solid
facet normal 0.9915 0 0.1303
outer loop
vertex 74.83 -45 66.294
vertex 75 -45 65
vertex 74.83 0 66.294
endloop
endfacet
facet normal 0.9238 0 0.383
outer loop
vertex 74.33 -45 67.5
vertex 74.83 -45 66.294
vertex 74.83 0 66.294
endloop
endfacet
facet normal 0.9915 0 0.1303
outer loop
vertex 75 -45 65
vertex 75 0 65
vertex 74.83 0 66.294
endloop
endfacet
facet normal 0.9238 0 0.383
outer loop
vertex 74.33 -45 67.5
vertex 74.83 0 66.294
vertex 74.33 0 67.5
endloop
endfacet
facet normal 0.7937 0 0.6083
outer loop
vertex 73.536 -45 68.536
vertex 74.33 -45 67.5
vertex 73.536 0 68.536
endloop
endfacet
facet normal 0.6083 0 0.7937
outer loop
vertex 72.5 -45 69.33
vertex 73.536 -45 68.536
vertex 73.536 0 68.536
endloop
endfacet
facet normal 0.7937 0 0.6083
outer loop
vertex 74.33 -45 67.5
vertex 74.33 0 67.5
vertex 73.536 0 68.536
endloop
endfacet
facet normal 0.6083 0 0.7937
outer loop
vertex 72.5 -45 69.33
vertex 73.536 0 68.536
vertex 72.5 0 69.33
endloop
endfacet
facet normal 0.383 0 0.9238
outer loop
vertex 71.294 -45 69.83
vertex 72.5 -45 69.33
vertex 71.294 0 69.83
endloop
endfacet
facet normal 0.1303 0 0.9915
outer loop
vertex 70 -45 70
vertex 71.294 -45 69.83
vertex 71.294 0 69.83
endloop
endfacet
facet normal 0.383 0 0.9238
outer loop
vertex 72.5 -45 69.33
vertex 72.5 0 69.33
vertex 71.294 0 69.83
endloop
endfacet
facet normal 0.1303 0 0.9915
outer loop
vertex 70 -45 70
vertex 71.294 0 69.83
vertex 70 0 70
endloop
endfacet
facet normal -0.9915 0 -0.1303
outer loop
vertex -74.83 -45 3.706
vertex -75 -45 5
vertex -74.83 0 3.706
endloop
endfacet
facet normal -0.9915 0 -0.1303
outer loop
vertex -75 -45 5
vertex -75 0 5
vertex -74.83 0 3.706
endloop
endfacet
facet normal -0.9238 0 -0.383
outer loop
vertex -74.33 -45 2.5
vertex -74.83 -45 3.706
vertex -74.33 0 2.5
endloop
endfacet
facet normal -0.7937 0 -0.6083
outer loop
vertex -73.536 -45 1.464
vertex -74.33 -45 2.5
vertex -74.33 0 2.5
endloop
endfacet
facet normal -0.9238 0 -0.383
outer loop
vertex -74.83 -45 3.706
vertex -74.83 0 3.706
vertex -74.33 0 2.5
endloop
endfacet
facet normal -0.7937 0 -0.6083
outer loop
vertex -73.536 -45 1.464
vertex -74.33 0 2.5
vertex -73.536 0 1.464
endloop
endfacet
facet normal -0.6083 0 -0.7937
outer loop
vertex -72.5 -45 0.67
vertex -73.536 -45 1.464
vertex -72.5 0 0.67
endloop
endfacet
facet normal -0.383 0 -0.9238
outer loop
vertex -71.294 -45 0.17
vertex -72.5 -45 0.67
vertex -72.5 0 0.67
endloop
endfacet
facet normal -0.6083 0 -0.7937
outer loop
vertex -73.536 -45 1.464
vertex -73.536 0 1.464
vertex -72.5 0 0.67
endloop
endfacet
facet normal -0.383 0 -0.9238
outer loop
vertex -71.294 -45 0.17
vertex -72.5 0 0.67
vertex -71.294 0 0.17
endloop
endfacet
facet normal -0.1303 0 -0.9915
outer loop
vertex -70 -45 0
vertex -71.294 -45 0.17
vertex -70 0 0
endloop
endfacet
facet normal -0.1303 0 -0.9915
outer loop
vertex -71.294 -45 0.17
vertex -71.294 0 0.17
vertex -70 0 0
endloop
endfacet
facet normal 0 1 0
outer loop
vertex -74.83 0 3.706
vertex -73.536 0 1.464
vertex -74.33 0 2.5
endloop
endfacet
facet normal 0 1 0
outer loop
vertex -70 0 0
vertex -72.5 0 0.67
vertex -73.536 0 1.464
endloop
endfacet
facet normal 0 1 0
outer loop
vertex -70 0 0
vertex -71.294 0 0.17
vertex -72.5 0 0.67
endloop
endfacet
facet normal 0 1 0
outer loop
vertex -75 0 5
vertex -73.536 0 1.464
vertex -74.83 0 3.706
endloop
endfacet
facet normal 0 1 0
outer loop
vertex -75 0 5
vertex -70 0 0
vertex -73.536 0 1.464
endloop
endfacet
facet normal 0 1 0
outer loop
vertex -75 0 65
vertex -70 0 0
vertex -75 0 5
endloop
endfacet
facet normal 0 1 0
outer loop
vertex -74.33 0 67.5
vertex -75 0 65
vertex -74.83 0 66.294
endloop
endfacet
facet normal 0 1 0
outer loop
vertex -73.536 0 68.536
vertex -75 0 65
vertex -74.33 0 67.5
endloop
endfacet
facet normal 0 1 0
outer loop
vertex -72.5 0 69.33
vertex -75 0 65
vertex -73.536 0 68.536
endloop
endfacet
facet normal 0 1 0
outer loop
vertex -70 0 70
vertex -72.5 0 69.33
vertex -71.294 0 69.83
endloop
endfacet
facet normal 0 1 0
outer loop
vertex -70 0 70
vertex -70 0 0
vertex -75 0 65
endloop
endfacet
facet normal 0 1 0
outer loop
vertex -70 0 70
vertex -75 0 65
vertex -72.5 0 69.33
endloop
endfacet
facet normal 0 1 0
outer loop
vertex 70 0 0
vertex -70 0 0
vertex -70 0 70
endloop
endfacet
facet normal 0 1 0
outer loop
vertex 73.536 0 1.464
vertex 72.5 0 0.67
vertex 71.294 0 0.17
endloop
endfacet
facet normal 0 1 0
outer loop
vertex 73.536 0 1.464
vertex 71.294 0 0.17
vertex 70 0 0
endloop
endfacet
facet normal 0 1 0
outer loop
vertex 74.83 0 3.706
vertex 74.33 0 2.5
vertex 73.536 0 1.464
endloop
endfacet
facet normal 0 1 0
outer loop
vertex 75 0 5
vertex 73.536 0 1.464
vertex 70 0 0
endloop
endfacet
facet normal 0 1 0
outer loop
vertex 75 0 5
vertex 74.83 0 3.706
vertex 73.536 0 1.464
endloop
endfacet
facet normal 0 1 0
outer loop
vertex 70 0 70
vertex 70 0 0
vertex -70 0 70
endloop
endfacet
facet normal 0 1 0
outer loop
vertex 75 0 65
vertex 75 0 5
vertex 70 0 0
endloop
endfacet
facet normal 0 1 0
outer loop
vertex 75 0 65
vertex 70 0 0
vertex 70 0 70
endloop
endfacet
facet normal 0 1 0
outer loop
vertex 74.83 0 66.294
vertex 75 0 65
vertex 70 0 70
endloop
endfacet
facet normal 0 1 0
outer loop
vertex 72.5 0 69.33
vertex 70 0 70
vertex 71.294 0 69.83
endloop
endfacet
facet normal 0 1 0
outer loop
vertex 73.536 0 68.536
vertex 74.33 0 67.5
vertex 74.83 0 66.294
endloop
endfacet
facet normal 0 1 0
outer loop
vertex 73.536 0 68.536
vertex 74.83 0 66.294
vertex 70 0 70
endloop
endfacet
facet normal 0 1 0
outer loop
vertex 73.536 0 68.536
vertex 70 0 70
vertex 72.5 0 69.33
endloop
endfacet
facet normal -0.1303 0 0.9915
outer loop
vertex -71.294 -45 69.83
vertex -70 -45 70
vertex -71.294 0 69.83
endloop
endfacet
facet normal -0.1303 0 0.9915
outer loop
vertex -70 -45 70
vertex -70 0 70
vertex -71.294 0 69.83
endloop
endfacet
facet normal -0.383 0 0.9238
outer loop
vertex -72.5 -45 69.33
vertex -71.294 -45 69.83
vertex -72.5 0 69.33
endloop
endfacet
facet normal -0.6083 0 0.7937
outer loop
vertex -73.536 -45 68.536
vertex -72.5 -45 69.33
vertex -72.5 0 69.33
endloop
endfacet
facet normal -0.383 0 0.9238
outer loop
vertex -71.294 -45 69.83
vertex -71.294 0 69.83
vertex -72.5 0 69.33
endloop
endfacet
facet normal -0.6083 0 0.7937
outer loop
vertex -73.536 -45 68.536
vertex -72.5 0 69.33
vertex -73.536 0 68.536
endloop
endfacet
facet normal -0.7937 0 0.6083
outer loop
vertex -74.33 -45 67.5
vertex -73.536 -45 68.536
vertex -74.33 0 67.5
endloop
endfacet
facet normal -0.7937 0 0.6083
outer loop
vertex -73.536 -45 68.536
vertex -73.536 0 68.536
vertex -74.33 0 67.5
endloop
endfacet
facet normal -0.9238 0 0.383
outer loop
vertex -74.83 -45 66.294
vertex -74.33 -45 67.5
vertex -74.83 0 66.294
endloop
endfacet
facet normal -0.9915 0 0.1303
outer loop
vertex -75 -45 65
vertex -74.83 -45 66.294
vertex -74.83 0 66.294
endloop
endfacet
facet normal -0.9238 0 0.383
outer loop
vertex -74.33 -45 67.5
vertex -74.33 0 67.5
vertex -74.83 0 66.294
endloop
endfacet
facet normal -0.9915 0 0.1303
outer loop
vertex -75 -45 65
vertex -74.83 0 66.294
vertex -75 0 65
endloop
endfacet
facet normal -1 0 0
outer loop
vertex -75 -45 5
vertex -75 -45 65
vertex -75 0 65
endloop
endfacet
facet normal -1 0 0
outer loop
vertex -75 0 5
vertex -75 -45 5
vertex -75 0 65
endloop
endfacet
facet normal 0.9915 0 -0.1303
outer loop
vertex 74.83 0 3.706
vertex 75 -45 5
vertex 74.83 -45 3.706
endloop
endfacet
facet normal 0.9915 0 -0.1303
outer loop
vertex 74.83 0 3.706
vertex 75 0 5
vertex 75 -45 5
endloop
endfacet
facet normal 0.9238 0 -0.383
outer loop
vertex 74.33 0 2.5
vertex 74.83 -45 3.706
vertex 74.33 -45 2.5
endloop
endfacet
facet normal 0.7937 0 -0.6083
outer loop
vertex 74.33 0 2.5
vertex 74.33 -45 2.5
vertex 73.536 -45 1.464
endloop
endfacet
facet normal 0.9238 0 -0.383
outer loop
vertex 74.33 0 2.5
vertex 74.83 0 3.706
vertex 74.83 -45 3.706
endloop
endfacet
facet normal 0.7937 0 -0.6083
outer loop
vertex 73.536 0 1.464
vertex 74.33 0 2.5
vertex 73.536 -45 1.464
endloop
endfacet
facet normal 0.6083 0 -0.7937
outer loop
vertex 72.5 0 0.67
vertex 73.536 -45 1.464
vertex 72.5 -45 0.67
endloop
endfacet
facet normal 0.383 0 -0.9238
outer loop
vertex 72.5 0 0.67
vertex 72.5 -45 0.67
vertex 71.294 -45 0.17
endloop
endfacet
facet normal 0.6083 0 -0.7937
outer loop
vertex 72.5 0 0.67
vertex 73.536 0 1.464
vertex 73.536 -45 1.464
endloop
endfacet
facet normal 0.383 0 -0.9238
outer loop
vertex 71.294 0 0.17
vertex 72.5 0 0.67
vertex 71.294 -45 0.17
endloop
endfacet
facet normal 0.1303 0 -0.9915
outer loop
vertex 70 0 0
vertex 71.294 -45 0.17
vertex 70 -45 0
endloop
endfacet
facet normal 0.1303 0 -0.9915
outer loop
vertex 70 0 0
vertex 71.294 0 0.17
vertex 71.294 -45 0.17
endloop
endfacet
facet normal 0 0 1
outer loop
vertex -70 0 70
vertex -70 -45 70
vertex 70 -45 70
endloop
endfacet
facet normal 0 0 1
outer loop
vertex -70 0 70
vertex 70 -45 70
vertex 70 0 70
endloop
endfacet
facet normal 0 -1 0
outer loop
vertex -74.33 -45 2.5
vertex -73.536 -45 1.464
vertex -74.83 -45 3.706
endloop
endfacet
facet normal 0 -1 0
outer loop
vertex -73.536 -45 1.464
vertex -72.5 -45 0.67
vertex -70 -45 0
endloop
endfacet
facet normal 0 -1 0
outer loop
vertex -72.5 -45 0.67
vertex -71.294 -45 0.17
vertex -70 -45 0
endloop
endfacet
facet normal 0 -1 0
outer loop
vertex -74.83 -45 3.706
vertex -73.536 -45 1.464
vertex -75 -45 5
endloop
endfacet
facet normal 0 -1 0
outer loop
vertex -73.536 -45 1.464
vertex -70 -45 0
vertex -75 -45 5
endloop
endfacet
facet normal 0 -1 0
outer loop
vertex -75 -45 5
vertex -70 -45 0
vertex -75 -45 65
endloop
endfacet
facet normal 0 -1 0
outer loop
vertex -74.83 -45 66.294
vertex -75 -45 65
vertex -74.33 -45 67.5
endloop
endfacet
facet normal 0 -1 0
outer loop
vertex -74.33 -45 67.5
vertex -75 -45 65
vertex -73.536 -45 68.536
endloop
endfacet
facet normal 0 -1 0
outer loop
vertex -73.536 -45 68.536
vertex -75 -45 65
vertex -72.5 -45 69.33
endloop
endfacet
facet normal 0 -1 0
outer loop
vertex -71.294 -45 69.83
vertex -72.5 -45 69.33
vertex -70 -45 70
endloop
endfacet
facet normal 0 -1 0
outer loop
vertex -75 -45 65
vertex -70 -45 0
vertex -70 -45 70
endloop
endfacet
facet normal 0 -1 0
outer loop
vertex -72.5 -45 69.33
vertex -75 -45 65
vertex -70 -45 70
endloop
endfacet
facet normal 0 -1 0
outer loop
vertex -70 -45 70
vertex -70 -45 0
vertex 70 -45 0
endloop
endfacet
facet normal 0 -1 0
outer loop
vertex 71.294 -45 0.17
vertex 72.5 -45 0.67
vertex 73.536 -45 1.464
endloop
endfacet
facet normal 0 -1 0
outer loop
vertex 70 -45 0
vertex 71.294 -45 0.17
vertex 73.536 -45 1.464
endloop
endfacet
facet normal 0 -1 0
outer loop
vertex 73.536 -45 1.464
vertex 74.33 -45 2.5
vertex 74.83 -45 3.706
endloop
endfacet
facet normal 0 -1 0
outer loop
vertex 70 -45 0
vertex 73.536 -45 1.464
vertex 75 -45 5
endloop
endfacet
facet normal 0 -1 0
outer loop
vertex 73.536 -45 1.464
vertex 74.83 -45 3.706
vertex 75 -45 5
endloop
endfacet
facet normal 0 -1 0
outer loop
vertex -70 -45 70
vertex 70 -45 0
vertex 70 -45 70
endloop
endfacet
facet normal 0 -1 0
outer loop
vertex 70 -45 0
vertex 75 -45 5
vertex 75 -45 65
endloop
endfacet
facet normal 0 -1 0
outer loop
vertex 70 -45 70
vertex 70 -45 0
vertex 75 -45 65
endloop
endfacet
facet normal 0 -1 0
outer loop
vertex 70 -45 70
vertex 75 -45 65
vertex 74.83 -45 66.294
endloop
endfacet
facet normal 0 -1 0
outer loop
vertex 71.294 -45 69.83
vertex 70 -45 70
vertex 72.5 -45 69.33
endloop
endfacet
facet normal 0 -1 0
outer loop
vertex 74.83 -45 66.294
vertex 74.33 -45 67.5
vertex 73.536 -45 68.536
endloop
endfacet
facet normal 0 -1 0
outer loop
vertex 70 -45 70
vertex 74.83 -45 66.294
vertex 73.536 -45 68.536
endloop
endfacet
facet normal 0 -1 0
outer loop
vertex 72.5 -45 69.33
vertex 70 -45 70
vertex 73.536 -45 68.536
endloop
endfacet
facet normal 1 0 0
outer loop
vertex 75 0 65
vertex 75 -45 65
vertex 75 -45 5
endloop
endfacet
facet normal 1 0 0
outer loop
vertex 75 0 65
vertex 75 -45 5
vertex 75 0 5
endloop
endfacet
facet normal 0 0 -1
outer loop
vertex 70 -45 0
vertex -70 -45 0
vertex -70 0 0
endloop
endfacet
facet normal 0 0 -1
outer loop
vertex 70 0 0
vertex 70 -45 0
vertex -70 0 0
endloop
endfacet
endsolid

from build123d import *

# Parameters (mm, degrees)
F0_W     = 45
F0_H     = 70
F1_DEPTH = 75
F3_R     = 5


with BuildPart() as f1:
    # F0 (on Right) → F1 (new body)
    with BuildSketch(Plane.YZ):
        with Locations((-22.5, 35)):
            Rectangle(F0_W, F0_H)
    extrude(amount=F1_DEPTH)

    # F2: F1 across face


with BuildPart() as f1_1:
    add(f1.part)
    add(f1.part.mirror(Plane(origin=(0, -22.5, 35), x_dir=(0, 1, 0), z_dir=(-1, 0, 0))))

    # F3
    f3_edges = [f1_1.edges().sort_by_distance(p)[0] for p in [
        (-75, -22.5, 70),
        (75, -22.5, 70),
        (75, -22.5, 0),
        (-75, -22.5, 0),
    ]]
    fillet(f3_edges, radius=F3_R)


solid = f1_1.part
